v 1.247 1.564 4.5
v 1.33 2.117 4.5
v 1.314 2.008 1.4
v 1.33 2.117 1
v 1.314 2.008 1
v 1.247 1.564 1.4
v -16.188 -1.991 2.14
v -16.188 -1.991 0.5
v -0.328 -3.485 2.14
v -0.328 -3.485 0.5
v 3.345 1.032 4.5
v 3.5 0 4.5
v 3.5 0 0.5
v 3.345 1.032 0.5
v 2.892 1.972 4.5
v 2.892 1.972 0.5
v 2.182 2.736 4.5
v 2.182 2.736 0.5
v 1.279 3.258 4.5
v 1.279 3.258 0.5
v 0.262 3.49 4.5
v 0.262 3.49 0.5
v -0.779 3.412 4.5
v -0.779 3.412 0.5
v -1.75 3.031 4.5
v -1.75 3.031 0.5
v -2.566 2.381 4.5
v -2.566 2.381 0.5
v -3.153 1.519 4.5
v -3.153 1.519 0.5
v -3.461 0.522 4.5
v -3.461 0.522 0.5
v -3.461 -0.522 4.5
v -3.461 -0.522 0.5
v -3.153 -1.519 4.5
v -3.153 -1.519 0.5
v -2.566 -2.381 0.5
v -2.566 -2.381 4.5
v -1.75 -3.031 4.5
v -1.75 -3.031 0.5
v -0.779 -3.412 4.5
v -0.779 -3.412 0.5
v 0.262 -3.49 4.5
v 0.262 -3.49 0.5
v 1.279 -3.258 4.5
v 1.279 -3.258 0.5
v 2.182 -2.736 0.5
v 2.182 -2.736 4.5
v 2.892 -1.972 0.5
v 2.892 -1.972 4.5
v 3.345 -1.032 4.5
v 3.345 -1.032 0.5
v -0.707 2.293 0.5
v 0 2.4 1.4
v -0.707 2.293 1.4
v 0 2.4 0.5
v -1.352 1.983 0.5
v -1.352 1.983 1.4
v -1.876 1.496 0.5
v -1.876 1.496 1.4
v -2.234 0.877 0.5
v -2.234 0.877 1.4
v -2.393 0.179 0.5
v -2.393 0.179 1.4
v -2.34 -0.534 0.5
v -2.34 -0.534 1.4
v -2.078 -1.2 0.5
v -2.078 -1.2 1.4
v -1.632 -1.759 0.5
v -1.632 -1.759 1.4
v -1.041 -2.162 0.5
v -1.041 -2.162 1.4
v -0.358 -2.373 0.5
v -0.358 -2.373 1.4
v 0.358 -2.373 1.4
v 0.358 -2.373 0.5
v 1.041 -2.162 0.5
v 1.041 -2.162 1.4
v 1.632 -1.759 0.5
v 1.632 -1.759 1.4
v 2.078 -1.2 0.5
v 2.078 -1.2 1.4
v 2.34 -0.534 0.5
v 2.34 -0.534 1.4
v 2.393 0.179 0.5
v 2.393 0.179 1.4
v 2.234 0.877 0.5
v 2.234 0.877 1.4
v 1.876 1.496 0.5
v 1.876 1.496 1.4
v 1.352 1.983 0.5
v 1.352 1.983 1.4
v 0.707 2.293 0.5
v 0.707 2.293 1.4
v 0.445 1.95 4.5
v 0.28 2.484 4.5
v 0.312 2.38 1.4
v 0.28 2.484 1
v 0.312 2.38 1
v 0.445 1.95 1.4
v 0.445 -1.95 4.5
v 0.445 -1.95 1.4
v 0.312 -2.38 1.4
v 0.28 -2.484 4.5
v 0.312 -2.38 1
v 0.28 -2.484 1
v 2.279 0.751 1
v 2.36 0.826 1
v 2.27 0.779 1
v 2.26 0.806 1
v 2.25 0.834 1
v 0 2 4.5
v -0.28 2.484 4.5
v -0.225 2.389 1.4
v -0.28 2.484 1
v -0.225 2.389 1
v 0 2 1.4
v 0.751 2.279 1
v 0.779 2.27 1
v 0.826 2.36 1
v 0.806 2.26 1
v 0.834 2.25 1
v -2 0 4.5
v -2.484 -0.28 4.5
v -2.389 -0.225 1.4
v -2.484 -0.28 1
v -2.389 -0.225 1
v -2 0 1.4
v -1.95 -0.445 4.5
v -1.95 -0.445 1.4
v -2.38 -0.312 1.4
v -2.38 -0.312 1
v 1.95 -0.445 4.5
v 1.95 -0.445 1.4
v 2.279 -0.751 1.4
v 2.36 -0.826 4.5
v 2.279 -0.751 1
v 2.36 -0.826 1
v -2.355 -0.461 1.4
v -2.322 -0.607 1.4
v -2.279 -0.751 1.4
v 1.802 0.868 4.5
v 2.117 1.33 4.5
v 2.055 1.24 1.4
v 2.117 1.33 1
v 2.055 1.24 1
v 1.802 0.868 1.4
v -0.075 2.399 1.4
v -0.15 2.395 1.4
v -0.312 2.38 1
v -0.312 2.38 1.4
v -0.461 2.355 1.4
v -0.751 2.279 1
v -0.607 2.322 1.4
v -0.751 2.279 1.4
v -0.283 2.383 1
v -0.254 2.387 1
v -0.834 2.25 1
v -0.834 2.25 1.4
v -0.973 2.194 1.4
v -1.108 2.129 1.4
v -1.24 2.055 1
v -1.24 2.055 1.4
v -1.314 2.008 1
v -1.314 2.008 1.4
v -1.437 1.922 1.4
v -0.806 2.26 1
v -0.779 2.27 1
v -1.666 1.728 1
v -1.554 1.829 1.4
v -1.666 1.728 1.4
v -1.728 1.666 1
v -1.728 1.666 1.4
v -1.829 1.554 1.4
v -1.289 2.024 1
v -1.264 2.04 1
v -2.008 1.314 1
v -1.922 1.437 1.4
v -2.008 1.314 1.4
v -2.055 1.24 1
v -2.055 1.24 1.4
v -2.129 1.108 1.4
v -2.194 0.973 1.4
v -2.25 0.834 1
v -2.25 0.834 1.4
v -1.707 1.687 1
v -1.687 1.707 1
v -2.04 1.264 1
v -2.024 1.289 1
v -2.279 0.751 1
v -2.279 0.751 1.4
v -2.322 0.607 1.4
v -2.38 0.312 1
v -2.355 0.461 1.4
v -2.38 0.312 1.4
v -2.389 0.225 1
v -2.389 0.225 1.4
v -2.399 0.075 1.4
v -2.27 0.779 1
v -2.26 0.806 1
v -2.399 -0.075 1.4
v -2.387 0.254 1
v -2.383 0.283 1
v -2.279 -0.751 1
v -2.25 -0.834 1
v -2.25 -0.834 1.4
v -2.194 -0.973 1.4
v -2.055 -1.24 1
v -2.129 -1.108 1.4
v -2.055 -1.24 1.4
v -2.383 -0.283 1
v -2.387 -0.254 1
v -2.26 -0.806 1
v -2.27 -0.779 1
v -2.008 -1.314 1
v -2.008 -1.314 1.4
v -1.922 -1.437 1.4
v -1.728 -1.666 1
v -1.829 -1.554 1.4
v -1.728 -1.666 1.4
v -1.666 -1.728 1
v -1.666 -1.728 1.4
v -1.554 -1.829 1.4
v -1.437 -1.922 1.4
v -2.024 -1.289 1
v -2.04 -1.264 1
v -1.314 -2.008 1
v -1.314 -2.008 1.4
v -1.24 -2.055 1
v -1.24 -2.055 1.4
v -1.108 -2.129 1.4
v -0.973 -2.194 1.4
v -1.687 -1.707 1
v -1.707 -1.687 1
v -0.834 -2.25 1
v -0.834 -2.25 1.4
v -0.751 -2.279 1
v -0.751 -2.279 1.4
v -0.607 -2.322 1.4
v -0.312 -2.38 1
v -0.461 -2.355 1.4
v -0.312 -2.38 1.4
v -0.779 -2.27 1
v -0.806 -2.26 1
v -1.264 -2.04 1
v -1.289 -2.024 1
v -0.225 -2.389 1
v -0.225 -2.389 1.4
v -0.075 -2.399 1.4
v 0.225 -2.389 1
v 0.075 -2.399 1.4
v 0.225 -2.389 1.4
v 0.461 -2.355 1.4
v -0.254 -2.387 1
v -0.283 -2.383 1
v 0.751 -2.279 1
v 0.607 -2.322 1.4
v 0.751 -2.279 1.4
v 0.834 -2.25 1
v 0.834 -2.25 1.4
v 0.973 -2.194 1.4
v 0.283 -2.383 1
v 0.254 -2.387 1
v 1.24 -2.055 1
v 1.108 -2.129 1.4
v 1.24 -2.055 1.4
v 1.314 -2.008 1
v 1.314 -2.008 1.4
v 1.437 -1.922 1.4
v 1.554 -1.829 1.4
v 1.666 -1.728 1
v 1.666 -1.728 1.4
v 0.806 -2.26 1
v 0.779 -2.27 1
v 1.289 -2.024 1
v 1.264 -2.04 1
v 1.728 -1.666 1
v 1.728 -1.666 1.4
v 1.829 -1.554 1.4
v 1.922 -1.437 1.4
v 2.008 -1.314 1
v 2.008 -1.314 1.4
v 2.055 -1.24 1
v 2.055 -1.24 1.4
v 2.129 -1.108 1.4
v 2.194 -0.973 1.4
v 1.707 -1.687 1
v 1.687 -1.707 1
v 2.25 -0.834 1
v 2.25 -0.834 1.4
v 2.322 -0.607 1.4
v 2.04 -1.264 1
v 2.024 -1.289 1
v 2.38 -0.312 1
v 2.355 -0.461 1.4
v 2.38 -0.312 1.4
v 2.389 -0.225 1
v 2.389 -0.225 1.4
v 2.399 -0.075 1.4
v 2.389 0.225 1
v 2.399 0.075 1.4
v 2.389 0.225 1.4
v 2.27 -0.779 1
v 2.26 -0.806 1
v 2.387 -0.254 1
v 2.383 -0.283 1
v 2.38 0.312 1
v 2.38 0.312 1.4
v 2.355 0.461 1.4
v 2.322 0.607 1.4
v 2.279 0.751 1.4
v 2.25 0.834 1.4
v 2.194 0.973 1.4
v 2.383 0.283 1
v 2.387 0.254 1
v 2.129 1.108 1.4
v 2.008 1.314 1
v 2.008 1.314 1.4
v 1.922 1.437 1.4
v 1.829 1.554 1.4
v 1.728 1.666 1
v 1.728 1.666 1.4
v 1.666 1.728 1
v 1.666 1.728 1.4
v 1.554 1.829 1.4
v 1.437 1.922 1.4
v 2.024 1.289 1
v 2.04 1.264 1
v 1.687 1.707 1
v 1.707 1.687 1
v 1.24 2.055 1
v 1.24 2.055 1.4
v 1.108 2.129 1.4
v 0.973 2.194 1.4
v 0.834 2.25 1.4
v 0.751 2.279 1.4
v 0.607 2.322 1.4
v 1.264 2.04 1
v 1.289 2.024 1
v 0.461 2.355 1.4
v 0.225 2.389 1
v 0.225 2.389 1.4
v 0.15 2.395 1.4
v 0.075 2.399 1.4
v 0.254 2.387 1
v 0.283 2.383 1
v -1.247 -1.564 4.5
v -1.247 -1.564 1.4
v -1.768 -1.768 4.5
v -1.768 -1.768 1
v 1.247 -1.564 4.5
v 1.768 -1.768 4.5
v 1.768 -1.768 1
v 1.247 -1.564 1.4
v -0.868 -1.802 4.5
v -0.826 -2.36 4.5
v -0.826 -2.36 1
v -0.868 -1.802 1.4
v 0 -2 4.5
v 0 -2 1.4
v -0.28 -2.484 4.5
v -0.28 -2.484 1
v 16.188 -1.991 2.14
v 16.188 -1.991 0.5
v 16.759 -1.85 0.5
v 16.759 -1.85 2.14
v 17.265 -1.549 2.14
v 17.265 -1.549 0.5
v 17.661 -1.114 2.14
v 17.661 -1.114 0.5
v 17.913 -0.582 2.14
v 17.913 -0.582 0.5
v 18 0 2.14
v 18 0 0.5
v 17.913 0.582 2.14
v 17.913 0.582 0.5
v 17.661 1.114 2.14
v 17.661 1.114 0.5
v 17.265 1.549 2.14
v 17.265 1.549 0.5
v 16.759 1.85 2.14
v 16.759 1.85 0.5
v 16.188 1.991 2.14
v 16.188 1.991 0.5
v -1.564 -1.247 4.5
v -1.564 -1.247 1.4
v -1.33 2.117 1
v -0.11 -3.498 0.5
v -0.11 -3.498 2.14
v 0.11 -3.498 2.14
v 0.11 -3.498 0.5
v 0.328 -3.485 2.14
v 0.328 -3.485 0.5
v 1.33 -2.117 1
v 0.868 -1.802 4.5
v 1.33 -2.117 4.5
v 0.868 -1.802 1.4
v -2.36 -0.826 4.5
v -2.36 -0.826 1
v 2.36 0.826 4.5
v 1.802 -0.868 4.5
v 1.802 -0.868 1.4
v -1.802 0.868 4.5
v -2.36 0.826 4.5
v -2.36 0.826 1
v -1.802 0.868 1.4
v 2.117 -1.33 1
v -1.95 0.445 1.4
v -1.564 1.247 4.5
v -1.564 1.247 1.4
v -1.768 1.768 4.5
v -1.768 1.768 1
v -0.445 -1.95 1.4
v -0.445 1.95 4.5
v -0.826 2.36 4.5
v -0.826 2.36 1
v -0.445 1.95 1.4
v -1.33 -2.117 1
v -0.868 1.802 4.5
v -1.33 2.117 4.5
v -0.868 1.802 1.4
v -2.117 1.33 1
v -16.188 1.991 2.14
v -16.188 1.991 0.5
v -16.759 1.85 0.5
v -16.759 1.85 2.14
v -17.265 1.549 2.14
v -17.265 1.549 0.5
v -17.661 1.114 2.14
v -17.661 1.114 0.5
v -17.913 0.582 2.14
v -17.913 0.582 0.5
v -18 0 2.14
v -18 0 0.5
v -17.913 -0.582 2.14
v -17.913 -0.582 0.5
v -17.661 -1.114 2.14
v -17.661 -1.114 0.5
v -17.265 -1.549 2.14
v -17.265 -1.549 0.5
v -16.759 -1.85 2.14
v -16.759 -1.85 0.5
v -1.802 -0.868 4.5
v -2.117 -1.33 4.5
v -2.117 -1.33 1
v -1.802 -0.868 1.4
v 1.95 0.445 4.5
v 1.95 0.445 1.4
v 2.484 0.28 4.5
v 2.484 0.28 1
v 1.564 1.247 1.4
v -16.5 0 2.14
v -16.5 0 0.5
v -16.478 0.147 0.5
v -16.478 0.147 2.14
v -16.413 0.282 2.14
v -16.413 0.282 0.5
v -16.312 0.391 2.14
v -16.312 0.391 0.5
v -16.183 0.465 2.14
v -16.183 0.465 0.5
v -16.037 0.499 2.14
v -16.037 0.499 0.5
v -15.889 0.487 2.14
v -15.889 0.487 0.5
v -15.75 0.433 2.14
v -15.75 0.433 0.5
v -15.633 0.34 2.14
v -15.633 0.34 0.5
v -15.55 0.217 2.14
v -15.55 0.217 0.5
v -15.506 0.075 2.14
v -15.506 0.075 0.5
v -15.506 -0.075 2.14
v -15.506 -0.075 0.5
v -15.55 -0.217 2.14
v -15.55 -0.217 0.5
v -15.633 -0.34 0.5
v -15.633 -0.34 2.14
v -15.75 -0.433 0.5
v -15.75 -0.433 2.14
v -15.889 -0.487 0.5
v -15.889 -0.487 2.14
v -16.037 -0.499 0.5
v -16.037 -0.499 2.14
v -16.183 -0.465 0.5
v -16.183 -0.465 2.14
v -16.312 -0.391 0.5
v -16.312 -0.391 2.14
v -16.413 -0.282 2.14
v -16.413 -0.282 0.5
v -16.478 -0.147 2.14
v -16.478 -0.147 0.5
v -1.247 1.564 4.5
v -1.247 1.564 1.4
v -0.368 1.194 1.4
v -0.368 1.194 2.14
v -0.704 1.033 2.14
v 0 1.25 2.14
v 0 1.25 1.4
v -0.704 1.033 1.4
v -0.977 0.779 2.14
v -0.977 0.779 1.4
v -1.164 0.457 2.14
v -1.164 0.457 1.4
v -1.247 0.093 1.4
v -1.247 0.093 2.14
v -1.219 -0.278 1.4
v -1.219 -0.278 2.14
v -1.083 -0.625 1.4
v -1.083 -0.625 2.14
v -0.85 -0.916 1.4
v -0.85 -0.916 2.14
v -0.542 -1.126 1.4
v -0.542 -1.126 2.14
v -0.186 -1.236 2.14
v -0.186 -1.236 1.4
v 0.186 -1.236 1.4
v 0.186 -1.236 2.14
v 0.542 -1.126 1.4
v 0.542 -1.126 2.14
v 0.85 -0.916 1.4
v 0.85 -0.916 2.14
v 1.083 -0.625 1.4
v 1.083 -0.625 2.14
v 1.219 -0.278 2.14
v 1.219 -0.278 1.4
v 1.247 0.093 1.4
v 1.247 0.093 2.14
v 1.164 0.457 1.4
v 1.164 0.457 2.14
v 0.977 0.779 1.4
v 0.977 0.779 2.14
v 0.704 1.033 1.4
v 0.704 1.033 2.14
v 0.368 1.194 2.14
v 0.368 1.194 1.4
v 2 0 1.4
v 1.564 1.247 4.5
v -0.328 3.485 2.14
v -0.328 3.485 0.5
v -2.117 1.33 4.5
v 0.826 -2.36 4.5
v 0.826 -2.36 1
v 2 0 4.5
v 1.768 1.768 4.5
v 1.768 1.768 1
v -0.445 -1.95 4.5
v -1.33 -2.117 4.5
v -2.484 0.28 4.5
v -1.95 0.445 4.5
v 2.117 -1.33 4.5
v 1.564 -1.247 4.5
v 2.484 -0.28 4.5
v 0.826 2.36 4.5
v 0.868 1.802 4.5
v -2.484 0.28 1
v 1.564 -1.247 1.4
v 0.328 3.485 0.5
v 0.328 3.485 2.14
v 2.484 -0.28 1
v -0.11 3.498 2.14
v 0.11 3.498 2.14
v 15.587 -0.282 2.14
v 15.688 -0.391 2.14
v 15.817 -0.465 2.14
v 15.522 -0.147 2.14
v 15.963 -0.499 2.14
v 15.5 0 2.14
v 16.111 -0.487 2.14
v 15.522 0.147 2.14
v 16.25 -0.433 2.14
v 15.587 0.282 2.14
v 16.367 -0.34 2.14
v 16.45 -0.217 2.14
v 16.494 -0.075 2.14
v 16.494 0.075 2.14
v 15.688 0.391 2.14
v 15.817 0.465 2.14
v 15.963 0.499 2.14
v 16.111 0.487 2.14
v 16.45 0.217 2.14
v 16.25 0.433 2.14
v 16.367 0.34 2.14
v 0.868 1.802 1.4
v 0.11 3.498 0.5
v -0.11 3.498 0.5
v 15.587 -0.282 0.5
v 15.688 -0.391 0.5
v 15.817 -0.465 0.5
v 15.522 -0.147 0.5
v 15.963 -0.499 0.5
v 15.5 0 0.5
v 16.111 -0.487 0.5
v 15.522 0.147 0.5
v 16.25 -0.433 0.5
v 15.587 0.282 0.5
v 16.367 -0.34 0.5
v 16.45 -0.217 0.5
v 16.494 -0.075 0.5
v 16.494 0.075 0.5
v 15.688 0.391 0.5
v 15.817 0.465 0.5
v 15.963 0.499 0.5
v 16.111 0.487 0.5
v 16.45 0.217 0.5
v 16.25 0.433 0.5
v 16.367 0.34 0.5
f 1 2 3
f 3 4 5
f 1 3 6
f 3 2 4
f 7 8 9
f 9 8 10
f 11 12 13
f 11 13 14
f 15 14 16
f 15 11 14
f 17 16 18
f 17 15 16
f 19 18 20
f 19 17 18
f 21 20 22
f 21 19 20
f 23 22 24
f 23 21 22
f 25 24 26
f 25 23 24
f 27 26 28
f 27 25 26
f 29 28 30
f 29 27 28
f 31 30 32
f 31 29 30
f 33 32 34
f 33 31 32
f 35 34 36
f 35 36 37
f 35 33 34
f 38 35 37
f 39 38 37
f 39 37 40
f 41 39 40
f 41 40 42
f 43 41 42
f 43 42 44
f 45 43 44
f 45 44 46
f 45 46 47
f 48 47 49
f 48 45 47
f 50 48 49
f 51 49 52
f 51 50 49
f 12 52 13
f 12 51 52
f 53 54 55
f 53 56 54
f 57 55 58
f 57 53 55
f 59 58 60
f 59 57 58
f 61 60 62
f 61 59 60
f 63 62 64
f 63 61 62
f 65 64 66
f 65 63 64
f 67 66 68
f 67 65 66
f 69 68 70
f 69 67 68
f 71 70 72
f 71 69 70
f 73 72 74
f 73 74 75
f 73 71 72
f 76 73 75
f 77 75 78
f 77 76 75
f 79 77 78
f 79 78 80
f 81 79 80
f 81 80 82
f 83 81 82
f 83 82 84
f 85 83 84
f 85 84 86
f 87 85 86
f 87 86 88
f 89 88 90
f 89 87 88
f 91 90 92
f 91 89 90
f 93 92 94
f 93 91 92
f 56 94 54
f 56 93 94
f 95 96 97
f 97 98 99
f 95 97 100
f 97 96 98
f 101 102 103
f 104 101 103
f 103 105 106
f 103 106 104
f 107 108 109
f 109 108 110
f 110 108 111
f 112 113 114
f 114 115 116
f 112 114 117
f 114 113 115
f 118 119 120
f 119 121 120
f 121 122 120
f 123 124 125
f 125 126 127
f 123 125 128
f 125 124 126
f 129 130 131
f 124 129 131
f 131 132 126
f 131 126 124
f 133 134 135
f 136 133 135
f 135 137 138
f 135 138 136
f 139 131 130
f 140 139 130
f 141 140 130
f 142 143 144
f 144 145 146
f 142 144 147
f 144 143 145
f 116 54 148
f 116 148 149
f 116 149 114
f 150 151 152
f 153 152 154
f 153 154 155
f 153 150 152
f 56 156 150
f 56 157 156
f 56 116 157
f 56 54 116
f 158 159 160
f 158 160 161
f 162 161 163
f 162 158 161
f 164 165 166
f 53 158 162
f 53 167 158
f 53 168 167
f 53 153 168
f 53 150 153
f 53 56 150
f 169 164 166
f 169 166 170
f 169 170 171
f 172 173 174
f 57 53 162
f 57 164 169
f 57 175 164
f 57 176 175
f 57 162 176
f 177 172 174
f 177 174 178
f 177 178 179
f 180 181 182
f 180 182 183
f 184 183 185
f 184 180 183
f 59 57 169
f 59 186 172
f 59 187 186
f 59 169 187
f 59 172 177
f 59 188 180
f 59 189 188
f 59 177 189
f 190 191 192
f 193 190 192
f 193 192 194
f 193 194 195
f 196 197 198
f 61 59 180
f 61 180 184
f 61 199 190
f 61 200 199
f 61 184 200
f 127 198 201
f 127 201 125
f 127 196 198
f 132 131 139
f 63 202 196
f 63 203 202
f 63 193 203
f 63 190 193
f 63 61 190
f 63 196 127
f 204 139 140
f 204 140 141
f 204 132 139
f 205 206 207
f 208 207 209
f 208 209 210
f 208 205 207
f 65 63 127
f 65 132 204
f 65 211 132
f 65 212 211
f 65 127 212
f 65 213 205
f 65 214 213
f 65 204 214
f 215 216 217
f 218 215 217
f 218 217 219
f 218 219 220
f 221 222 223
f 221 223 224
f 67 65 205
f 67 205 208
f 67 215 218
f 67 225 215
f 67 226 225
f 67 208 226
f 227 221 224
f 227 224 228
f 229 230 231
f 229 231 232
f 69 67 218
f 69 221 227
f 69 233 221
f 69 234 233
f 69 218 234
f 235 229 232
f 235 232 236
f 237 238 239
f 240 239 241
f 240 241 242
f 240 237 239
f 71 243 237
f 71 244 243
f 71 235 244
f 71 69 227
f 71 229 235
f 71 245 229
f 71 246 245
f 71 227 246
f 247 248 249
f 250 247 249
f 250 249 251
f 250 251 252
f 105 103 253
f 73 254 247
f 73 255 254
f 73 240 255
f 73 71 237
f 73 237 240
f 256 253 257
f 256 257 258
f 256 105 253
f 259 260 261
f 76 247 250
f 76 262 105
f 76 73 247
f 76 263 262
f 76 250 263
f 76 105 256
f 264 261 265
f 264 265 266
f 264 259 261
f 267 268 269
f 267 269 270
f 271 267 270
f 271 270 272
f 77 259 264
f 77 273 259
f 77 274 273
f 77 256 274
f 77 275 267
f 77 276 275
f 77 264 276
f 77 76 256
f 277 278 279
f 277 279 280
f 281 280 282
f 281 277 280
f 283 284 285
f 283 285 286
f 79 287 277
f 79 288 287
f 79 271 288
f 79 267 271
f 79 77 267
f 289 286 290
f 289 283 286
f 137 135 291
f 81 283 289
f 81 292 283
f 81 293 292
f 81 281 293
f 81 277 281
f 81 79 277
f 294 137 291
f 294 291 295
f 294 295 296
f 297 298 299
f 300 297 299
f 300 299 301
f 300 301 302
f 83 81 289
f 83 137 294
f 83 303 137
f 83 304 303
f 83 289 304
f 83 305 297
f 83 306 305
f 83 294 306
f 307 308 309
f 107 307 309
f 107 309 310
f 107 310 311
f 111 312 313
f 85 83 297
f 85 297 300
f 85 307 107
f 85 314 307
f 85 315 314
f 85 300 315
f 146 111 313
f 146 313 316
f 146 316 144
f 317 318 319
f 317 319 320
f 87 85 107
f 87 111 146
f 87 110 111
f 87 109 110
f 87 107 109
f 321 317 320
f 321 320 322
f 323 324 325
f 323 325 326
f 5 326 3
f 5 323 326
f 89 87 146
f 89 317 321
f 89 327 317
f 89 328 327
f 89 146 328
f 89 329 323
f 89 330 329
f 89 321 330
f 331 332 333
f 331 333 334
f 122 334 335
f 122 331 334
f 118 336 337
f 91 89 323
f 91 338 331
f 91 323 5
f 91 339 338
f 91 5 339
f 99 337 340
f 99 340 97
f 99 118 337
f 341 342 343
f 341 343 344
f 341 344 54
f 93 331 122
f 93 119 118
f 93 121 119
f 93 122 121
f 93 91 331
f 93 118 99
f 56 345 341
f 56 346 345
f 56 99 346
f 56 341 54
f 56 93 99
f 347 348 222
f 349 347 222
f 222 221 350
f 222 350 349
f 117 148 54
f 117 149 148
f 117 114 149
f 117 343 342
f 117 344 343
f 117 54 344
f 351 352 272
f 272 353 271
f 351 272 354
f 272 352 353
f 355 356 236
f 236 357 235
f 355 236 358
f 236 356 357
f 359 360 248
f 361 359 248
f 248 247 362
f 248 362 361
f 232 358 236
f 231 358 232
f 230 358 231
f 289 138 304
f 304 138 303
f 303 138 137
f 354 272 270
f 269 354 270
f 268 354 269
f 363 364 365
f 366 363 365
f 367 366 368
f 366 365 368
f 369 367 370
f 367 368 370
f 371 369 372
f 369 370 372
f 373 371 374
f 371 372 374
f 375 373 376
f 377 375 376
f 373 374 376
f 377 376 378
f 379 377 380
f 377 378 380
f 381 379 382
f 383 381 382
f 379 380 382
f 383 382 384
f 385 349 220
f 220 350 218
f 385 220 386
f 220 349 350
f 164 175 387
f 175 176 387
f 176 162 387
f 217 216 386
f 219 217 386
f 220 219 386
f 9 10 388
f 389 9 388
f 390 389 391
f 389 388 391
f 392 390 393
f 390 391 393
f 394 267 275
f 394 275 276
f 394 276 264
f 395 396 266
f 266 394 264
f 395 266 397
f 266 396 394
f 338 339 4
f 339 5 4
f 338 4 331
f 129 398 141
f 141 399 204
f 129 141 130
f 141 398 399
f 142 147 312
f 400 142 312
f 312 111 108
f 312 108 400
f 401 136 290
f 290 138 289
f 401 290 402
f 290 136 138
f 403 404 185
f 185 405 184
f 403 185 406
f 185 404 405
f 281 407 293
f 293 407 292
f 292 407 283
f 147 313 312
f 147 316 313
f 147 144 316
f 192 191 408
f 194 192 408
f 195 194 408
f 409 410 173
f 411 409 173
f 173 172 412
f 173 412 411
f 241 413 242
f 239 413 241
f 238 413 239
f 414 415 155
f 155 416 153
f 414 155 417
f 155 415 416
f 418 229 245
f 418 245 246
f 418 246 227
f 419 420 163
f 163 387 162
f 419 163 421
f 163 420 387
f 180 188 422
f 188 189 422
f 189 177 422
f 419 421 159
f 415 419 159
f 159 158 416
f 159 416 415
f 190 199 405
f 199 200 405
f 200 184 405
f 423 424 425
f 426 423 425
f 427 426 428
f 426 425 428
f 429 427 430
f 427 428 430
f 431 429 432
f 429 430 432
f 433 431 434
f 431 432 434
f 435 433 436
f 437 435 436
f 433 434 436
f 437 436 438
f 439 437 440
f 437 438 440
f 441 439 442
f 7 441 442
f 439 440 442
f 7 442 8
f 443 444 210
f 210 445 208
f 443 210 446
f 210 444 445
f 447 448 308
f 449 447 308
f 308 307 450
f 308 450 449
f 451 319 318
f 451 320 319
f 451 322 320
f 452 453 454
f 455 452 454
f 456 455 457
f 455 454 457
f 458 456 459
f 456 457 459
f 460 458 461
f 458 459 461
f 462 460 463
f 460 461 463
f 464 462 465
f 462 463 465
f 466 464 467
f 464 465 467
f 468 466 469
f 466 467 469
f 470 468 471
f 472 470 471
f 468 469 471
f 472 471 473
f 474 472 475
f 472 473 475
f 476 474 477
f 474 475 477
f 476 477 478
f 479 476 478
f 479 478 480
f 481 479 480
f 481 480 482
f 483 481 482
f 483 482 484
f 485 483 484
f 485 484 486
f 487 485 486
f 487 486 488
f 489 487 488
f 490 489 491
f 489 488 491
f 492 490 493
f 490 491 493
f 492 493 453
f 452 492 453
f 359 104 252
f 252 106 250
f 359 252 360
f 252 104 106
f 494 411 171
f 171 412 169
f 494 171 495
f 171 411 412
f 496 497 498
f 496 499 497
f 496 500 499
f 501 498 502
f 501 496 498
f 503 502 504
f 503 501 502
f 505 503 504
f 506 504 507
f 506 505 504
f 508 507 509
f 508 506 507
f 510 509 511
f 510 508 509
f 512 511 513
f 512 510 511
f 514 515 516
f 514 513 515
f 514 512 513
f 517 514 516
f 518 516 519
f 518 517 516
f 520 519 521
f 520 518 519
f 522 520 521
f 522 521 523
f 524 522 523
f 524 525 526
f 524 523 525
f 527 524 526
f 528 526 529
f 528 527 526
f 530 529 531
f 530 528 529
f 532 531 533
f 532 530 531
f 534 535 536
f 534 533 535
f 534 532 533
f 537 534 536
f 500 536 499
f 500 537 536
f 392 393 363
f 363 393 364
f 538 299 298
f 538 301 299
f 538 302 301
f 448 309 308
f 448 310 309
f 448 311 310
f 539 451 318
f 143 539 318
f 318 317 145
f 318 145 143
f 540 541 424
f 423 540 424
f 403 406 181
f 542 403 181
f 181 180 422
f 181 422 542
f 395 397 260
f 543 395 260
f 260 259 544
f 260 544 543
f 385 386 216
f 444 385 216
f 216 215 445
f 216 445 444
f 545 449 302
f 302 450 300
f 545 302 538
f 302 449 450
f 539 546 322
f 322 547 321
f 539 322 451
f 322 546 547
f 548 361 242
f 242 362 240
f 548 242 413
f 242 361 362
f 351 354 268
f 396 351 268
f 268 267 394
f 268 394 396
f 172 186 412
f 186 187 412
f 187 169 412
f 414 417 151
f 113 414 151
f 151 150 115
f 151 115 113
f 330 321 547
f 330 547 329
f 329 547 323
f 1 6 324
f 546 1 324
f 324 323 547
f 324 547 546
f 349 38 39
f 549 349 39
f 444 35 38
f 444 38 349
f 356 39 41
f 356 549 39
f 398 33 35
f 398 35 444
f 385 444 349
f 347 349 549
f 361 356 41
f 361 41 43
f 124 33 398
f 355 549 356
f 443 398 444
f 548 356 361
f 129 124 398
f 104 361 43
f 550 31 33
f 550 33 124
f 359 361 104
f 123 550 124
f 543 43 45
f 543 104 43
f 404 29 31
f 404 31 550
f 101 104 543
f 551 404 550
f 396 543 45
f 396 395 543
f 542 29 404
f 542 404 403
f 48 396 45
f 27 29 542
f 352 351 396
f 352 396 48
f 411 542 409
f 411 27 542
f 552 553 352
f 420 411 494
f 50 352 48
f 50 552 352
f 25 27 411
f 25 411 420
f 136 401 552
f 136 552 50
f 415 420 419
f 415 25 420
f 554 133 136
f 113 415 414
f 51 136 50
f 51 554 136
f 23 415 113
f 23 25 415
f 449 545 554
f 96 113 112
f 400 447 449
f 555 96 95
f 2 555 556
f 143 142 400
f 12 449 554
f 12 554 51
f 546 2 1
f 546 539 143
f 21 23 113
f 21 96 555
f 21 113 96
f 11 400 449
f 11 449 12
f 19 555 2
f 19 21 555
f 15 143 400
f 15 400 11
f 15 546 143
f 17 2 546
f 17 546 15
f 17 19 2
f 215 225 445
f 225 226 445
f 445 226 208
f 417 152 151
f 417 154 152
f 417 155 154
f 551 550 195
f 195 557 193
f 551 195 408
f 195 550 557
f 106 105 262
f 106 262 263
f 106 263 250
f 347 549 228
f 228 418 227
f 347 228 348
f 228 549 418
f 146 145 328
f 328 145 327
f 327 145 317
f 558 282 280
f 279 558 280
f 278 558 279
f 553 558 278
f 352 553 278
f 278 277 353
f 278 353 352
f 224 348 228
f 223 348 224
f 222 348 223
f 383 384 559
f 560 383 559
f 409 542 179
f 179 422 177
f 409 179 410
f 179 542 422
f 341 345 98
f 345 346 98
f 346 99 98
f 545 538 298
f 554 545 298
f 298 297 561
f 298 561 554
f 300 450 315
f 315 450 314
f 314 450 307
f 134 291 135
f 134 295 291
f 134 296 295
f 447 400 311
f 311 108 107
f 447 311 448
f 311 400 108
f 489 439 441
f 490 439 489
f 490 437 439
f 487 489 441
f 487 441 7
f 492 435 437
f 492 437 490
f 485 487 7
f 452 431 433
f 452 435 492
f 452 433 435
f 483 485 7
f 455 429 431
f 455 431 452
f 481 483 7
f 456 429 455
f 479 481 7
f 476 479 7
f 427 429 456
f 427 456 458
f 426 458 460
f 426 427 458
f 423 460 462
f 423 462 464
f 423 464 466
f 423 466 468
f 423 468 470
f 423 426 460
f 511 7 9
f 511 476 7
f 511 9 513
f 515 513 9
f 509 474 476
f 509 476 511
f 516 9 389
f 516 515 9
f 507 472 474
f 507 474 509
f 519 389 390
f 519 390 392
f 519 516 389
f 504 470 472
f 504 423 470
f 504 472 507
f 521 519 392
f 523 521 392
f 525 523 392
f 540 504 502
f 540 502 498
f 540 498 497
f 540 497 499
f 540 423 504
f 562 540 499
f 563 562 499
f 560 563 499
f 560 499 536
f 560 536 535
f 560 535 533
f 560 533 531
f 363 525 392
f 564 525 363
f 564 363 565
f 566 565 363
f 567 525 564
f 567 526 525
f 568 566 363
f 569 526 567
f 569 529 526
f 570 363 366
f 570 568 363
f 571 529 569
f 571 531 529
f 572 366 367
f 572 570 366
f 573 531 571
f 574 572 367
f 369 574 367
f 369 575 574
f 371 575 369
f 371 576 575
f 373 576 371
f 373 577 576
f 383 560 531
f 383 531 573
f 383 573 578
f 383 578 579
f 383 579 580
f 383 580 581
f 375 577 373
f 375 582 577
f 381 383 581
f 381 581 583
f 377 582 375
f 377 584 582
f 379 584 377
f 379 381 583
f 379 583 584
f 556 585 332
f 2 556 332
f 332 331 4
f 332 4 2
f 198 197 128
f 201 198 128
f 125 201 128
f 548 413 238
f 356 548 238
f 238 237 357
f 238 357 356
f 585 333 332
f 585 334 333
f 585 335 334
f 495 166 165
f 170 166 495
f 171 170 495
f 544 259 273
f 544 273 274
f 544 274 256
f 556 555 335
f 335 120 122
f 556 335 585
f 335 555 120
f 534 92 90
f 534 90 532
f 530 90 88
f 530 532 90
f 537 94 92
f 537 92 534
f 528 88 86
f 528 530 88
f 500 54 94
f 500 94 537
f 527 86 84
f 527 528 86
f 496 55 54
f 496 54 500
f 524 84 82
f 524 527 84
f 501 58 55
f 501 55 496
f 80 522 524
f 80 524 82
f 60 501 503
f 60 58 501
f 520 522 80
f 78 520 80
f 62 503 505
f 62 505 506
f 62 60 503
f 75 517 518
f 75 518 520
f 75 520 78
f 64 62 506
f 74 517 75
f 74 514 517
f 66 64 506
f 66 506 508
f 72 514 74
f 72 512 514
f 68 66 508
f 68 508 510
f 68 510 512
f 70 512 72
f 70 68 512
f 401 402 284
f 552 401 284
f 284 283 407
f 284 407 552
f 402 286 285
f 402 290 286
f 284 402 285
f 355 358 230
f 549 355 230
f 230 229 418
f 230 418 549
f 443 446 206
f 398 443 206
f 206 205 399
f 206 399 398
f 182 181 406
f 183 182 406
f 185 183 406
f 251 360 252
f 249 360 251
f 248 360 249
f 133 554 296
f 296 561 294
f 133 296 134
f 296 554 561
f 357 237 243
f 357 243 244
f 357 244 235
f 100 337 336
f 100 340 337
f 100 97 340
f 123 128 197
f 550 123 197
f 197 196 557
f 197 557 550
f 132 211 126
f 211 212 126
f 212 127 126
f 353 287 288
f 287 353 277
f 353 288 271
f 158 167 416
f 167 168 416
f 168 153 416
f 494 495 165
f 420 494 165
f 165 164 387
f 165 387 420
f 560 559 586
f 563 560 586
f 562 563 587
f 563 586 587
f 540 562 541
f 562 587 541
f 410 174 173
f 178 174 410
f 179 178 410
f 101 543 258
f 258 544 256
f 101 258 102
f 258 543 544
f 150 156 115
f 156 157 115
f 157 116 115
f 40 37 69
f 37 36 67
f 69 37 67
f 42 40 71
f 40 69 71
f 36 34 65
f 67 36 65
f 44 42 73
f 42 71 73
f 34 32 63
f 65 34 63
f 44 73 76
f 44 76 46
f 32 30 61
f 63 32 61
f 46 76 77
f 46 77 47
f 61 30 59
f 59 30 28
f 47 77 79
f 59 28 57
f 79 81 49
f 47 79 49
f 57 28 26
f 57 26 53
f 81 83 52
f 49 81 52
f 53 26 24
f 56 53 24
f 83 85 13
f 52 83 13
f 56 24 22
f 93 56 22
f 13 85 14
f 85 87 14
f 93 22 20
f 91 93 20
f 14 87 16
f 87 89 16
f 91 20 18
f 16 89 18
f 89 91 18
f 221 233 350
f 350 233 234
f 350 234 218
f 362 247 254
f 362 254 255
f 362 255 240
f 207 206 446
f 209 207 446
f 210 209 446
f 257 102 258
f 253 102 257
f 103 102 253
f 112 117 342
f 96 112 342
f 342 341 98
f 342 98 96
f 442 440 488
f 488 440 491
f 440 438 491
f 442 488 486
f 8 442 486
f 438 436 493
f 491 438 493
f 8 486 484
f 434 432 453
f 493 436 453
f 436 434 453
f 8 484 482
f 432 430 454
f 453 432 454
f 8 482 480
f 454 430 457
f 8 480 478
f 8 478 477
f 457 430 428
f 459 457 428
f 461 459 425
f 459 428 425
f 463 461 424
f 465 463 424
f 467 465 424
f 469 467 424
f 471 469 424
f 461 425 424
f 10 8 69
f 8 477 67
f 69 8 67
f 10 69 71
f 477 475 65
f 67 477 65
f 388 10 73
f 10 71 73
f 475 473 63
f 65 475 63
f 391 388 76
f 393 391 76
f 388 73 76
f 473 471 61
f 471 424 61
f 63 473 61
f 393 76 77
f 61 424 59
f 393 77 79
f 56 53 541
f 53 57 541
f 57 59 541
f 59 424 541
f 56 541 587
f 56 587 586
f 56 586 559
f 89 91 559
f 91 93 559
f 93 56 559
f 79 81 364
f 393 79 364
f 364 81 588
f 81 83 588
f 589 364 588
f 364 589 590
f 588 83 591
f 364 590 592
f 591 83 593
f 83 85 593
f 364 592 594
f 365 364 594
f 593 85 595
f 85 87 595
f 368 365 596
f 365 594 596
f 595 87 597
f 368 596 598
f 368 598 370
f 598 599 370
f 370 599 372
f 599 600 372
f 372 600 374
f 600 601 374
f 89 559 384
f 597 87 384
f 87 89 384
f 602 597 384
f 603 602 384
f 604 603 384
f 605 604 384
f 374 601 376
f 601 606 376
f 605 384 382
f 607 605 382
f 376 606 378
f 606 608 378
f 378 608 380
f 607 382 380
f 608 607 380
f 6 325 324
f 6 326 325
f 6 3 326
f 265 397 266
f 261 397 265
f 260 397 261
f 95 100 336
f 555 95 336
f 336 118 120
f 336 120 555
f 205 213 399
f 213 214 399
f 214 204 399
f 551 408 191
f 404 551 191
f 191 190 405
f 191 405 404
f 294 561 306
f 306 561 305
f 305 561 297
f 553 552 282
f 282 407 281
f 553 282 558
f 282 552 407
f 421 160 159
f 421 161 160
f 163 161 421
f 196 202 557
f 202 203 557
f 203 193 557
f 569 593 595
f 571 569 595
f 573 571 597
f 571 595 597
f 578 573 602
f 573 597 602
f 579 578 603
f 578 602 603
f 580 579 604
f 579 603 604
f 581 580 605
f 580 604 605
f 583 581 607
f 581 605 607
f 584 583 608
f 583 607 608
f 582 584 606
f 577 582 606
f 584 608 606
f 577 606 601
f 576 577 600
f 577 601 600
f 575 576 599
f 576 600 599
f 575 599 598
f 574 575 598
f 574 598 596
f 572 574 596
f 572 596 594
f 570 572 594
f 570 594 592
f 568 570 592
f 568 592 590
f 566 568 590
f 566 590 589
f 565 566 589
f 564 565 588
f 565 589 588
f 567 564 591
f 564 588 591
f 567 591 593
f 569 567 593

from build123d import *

# Parameters (mm, degrees)
SKETCH_1_R      = 1
EXTRUDE_1_DEPTH = 4.3
SKETCH_2_R      = 2
EXTRUDE_2_DEPTH = 1
EXTRUDE_3_DEPTH = 3.5
SKETCH_7_R      = 3.5
EXTRUDE_4_DEPTH = 4
SKETCH_9_R      = 0.5
EXTRUDE_5_DEPTH = 1.64


with BuildPart() as part:
    # 草图1 → 凸台-拉伸1 (new body)
    with BuildSketch(Plane.XY):
        Circle(SKETCH_1_R)
    extrude(amount=-EXTRUDE_1_DEPTH)

    # 草图2 → 凸台-拉伸2 (add)
    with BuildSketch(Plane.XY):
        Circle(SKETCH_2_R)
    extrude(amount=EXTRUDE_2_DEPTH)

    # 草图3 → 凸台-拉伸3 (add)
    with BuildSketch(Plane.XY.offset(1)):
        Polygon((2.359708326, -0.825697655), (1.801937736, -0.867767478), (2.116810498, -1.330080191), (1.563662965, -1.246979604), (1.767766953, -1.767766953), (1.246979604, -1.563662965), (1.330080191, -2.116810498), (0.867767478, -1.801937736), (0.825697655, -2.359708326), (0.445041868, -1.949855824), (0.27991119, -2.484280525), (0, -2), (-0.27991119, -2.484280525), (-0.445041868, -1.949855824), (-0.825697655, -2.359708326), (-0.867767478, -1.801937736), (-1.330080191, -2.116810498), (-1.246979604, -1.563662965), (-1.767766953, -1.767766953), (-1.563662965, -1.246979604), (-2.116810498, -1.330080191), (-1.801937736, -0.867767478), (-2.359708326, -0.825697655), (-1.949855824, -0.445041868), (-2.484280525, -0.27991119), (-2, 0), (-2.484280525, 0.27991119), (-1.949855824, 0.445041868), (-2.359708326, 0.825697655), (-1.801937736, 0.867767478), (-2.116810498, 1.330080191), (-1.563662965, 1.246979604), (-1.767766953, 1.767766953), (-1.246979604, 1.563662965), (-1.330080191, 2.116810498), (-0.867767478, 1.801937736), (-0.825697655, 2.359708326), (-0.445041868, 1.949855824), (-0.27991119, 2.484280525), (0, 2), (0.27991119, 2.484280525), (0.445041868, 1.949855824), (0.825697655, 2.359708326), (0.867767478, 1.801937736), (1.330080191, 2.116810498), (1.246979604, 1.563662965), (1.767766953, 1.767766953), (1.563662965, 1.246979604), (2.116810498, 1.330080191), (1.801937736, 0.867767478), (2.359708326, 0.825697655), (1.949855824, 0.445041868), (2.484280525, 0.27991119), (2, 0), (2.484280525, -0.27991119), (1.949855824, -0.445041868), align=None)
    extrude(amount=EXTRUDE_3_DEPTH)


with BuildPart() as body_2:
    # 草图7 → 凸台-拉伸4 (new body)
    with BuildSketch(Plane.XY.offset(4.5)):
        Circle(SKETCH_7_R)
    extrude(amount=-EXTRUDE_4_DEPTH)

    # Combine 1: cut part
    add(part.part, mode=Mode.SUBTRACT)


with BuildPart() as body_2_2:
    # 草图9 → 凸台-拉伸5 (new body)
    with BuildSketch(Plane(origin=(0, 0, 0.5), x_dir=(-1, 0, 0), z_dir=(0, 0, -1))):
        with BuildLine():
            Line((-16.187500002, 1.991191539), (-0.328125, 3.484585195))
            ThreePointArc((-0.328125, 3.484585195), (0, 3.5), (0.328125, 3.484585195))
            Line((0.328125, 3.484585195), (16.187500002, 1.991191539))
            ThreePointArc((16.187500002, 1.991191539), (17.999999999, -1e-09), (16.1875, -1.99119154))
            Line((16.1875, -1.99119154), (0.328125, -3.484585195))
            ThreePointArc((0.328125, -3.484585195), (0, -3.5), (-0.328125, -3.484585195))
            Line((-0.328125, -3.484585195), (-16.1875, -1.99119154))
            ThreePointArc((-16.1875, -1.99119154), (-17.999999999, -1e-09), (-16.187500002, 1.991191539))
        make_face()
        with Locations((16, 0)):
            Circle(SKETCH_9_R, mode=Mode.SUBTRACT)
        with Locations((-16, 0)):
            Circle(SKETCH_9_R, mode=Mode.SUBTRACT)
    extrude(amount=-EXTRUDE_5_DEPTH)


with BuildPart() as hole_wizard_m2_1_tool:
    # 草图12 → M2 六角凹头螺钉的柱形沉头孔1 (revolve)
    with BuildSketch(Plane(origin=(0, 0, 0.5), x_dir=(0, 1, 0), z_dir=(1, 0, 0))):
        Polygon((0, 0), (0, 4), (1.25, 3.248924226), (1.25, 0.9), (2.4, 0.9), (2.4, 0), align=None)
    revolve(axis=Axis((0, 0, -5.85), (0, 0, 1)))


with BuildPart() as body_2_1:
    add(body_2.part)

    # M2 六角凹头螺钉的柱形沉头孔1: cut by hole_wizard_m2_1_tool
    add(hole_wizard_m2_1_tool.part, mode=Mode.SUBTRACT)


with BuildPart() as body_2_2_1:
    add(body_2_2.part)

    # M2 六角凹头螺钉的柱形沉头孔1: cut by hole_wizard_m2_1_tool
    add(hole_wizard_m2_1_tool.part, mode=Mode.SUBTRACT)


solid = Compound([body_2_1.part, body_2_2_1.part])
